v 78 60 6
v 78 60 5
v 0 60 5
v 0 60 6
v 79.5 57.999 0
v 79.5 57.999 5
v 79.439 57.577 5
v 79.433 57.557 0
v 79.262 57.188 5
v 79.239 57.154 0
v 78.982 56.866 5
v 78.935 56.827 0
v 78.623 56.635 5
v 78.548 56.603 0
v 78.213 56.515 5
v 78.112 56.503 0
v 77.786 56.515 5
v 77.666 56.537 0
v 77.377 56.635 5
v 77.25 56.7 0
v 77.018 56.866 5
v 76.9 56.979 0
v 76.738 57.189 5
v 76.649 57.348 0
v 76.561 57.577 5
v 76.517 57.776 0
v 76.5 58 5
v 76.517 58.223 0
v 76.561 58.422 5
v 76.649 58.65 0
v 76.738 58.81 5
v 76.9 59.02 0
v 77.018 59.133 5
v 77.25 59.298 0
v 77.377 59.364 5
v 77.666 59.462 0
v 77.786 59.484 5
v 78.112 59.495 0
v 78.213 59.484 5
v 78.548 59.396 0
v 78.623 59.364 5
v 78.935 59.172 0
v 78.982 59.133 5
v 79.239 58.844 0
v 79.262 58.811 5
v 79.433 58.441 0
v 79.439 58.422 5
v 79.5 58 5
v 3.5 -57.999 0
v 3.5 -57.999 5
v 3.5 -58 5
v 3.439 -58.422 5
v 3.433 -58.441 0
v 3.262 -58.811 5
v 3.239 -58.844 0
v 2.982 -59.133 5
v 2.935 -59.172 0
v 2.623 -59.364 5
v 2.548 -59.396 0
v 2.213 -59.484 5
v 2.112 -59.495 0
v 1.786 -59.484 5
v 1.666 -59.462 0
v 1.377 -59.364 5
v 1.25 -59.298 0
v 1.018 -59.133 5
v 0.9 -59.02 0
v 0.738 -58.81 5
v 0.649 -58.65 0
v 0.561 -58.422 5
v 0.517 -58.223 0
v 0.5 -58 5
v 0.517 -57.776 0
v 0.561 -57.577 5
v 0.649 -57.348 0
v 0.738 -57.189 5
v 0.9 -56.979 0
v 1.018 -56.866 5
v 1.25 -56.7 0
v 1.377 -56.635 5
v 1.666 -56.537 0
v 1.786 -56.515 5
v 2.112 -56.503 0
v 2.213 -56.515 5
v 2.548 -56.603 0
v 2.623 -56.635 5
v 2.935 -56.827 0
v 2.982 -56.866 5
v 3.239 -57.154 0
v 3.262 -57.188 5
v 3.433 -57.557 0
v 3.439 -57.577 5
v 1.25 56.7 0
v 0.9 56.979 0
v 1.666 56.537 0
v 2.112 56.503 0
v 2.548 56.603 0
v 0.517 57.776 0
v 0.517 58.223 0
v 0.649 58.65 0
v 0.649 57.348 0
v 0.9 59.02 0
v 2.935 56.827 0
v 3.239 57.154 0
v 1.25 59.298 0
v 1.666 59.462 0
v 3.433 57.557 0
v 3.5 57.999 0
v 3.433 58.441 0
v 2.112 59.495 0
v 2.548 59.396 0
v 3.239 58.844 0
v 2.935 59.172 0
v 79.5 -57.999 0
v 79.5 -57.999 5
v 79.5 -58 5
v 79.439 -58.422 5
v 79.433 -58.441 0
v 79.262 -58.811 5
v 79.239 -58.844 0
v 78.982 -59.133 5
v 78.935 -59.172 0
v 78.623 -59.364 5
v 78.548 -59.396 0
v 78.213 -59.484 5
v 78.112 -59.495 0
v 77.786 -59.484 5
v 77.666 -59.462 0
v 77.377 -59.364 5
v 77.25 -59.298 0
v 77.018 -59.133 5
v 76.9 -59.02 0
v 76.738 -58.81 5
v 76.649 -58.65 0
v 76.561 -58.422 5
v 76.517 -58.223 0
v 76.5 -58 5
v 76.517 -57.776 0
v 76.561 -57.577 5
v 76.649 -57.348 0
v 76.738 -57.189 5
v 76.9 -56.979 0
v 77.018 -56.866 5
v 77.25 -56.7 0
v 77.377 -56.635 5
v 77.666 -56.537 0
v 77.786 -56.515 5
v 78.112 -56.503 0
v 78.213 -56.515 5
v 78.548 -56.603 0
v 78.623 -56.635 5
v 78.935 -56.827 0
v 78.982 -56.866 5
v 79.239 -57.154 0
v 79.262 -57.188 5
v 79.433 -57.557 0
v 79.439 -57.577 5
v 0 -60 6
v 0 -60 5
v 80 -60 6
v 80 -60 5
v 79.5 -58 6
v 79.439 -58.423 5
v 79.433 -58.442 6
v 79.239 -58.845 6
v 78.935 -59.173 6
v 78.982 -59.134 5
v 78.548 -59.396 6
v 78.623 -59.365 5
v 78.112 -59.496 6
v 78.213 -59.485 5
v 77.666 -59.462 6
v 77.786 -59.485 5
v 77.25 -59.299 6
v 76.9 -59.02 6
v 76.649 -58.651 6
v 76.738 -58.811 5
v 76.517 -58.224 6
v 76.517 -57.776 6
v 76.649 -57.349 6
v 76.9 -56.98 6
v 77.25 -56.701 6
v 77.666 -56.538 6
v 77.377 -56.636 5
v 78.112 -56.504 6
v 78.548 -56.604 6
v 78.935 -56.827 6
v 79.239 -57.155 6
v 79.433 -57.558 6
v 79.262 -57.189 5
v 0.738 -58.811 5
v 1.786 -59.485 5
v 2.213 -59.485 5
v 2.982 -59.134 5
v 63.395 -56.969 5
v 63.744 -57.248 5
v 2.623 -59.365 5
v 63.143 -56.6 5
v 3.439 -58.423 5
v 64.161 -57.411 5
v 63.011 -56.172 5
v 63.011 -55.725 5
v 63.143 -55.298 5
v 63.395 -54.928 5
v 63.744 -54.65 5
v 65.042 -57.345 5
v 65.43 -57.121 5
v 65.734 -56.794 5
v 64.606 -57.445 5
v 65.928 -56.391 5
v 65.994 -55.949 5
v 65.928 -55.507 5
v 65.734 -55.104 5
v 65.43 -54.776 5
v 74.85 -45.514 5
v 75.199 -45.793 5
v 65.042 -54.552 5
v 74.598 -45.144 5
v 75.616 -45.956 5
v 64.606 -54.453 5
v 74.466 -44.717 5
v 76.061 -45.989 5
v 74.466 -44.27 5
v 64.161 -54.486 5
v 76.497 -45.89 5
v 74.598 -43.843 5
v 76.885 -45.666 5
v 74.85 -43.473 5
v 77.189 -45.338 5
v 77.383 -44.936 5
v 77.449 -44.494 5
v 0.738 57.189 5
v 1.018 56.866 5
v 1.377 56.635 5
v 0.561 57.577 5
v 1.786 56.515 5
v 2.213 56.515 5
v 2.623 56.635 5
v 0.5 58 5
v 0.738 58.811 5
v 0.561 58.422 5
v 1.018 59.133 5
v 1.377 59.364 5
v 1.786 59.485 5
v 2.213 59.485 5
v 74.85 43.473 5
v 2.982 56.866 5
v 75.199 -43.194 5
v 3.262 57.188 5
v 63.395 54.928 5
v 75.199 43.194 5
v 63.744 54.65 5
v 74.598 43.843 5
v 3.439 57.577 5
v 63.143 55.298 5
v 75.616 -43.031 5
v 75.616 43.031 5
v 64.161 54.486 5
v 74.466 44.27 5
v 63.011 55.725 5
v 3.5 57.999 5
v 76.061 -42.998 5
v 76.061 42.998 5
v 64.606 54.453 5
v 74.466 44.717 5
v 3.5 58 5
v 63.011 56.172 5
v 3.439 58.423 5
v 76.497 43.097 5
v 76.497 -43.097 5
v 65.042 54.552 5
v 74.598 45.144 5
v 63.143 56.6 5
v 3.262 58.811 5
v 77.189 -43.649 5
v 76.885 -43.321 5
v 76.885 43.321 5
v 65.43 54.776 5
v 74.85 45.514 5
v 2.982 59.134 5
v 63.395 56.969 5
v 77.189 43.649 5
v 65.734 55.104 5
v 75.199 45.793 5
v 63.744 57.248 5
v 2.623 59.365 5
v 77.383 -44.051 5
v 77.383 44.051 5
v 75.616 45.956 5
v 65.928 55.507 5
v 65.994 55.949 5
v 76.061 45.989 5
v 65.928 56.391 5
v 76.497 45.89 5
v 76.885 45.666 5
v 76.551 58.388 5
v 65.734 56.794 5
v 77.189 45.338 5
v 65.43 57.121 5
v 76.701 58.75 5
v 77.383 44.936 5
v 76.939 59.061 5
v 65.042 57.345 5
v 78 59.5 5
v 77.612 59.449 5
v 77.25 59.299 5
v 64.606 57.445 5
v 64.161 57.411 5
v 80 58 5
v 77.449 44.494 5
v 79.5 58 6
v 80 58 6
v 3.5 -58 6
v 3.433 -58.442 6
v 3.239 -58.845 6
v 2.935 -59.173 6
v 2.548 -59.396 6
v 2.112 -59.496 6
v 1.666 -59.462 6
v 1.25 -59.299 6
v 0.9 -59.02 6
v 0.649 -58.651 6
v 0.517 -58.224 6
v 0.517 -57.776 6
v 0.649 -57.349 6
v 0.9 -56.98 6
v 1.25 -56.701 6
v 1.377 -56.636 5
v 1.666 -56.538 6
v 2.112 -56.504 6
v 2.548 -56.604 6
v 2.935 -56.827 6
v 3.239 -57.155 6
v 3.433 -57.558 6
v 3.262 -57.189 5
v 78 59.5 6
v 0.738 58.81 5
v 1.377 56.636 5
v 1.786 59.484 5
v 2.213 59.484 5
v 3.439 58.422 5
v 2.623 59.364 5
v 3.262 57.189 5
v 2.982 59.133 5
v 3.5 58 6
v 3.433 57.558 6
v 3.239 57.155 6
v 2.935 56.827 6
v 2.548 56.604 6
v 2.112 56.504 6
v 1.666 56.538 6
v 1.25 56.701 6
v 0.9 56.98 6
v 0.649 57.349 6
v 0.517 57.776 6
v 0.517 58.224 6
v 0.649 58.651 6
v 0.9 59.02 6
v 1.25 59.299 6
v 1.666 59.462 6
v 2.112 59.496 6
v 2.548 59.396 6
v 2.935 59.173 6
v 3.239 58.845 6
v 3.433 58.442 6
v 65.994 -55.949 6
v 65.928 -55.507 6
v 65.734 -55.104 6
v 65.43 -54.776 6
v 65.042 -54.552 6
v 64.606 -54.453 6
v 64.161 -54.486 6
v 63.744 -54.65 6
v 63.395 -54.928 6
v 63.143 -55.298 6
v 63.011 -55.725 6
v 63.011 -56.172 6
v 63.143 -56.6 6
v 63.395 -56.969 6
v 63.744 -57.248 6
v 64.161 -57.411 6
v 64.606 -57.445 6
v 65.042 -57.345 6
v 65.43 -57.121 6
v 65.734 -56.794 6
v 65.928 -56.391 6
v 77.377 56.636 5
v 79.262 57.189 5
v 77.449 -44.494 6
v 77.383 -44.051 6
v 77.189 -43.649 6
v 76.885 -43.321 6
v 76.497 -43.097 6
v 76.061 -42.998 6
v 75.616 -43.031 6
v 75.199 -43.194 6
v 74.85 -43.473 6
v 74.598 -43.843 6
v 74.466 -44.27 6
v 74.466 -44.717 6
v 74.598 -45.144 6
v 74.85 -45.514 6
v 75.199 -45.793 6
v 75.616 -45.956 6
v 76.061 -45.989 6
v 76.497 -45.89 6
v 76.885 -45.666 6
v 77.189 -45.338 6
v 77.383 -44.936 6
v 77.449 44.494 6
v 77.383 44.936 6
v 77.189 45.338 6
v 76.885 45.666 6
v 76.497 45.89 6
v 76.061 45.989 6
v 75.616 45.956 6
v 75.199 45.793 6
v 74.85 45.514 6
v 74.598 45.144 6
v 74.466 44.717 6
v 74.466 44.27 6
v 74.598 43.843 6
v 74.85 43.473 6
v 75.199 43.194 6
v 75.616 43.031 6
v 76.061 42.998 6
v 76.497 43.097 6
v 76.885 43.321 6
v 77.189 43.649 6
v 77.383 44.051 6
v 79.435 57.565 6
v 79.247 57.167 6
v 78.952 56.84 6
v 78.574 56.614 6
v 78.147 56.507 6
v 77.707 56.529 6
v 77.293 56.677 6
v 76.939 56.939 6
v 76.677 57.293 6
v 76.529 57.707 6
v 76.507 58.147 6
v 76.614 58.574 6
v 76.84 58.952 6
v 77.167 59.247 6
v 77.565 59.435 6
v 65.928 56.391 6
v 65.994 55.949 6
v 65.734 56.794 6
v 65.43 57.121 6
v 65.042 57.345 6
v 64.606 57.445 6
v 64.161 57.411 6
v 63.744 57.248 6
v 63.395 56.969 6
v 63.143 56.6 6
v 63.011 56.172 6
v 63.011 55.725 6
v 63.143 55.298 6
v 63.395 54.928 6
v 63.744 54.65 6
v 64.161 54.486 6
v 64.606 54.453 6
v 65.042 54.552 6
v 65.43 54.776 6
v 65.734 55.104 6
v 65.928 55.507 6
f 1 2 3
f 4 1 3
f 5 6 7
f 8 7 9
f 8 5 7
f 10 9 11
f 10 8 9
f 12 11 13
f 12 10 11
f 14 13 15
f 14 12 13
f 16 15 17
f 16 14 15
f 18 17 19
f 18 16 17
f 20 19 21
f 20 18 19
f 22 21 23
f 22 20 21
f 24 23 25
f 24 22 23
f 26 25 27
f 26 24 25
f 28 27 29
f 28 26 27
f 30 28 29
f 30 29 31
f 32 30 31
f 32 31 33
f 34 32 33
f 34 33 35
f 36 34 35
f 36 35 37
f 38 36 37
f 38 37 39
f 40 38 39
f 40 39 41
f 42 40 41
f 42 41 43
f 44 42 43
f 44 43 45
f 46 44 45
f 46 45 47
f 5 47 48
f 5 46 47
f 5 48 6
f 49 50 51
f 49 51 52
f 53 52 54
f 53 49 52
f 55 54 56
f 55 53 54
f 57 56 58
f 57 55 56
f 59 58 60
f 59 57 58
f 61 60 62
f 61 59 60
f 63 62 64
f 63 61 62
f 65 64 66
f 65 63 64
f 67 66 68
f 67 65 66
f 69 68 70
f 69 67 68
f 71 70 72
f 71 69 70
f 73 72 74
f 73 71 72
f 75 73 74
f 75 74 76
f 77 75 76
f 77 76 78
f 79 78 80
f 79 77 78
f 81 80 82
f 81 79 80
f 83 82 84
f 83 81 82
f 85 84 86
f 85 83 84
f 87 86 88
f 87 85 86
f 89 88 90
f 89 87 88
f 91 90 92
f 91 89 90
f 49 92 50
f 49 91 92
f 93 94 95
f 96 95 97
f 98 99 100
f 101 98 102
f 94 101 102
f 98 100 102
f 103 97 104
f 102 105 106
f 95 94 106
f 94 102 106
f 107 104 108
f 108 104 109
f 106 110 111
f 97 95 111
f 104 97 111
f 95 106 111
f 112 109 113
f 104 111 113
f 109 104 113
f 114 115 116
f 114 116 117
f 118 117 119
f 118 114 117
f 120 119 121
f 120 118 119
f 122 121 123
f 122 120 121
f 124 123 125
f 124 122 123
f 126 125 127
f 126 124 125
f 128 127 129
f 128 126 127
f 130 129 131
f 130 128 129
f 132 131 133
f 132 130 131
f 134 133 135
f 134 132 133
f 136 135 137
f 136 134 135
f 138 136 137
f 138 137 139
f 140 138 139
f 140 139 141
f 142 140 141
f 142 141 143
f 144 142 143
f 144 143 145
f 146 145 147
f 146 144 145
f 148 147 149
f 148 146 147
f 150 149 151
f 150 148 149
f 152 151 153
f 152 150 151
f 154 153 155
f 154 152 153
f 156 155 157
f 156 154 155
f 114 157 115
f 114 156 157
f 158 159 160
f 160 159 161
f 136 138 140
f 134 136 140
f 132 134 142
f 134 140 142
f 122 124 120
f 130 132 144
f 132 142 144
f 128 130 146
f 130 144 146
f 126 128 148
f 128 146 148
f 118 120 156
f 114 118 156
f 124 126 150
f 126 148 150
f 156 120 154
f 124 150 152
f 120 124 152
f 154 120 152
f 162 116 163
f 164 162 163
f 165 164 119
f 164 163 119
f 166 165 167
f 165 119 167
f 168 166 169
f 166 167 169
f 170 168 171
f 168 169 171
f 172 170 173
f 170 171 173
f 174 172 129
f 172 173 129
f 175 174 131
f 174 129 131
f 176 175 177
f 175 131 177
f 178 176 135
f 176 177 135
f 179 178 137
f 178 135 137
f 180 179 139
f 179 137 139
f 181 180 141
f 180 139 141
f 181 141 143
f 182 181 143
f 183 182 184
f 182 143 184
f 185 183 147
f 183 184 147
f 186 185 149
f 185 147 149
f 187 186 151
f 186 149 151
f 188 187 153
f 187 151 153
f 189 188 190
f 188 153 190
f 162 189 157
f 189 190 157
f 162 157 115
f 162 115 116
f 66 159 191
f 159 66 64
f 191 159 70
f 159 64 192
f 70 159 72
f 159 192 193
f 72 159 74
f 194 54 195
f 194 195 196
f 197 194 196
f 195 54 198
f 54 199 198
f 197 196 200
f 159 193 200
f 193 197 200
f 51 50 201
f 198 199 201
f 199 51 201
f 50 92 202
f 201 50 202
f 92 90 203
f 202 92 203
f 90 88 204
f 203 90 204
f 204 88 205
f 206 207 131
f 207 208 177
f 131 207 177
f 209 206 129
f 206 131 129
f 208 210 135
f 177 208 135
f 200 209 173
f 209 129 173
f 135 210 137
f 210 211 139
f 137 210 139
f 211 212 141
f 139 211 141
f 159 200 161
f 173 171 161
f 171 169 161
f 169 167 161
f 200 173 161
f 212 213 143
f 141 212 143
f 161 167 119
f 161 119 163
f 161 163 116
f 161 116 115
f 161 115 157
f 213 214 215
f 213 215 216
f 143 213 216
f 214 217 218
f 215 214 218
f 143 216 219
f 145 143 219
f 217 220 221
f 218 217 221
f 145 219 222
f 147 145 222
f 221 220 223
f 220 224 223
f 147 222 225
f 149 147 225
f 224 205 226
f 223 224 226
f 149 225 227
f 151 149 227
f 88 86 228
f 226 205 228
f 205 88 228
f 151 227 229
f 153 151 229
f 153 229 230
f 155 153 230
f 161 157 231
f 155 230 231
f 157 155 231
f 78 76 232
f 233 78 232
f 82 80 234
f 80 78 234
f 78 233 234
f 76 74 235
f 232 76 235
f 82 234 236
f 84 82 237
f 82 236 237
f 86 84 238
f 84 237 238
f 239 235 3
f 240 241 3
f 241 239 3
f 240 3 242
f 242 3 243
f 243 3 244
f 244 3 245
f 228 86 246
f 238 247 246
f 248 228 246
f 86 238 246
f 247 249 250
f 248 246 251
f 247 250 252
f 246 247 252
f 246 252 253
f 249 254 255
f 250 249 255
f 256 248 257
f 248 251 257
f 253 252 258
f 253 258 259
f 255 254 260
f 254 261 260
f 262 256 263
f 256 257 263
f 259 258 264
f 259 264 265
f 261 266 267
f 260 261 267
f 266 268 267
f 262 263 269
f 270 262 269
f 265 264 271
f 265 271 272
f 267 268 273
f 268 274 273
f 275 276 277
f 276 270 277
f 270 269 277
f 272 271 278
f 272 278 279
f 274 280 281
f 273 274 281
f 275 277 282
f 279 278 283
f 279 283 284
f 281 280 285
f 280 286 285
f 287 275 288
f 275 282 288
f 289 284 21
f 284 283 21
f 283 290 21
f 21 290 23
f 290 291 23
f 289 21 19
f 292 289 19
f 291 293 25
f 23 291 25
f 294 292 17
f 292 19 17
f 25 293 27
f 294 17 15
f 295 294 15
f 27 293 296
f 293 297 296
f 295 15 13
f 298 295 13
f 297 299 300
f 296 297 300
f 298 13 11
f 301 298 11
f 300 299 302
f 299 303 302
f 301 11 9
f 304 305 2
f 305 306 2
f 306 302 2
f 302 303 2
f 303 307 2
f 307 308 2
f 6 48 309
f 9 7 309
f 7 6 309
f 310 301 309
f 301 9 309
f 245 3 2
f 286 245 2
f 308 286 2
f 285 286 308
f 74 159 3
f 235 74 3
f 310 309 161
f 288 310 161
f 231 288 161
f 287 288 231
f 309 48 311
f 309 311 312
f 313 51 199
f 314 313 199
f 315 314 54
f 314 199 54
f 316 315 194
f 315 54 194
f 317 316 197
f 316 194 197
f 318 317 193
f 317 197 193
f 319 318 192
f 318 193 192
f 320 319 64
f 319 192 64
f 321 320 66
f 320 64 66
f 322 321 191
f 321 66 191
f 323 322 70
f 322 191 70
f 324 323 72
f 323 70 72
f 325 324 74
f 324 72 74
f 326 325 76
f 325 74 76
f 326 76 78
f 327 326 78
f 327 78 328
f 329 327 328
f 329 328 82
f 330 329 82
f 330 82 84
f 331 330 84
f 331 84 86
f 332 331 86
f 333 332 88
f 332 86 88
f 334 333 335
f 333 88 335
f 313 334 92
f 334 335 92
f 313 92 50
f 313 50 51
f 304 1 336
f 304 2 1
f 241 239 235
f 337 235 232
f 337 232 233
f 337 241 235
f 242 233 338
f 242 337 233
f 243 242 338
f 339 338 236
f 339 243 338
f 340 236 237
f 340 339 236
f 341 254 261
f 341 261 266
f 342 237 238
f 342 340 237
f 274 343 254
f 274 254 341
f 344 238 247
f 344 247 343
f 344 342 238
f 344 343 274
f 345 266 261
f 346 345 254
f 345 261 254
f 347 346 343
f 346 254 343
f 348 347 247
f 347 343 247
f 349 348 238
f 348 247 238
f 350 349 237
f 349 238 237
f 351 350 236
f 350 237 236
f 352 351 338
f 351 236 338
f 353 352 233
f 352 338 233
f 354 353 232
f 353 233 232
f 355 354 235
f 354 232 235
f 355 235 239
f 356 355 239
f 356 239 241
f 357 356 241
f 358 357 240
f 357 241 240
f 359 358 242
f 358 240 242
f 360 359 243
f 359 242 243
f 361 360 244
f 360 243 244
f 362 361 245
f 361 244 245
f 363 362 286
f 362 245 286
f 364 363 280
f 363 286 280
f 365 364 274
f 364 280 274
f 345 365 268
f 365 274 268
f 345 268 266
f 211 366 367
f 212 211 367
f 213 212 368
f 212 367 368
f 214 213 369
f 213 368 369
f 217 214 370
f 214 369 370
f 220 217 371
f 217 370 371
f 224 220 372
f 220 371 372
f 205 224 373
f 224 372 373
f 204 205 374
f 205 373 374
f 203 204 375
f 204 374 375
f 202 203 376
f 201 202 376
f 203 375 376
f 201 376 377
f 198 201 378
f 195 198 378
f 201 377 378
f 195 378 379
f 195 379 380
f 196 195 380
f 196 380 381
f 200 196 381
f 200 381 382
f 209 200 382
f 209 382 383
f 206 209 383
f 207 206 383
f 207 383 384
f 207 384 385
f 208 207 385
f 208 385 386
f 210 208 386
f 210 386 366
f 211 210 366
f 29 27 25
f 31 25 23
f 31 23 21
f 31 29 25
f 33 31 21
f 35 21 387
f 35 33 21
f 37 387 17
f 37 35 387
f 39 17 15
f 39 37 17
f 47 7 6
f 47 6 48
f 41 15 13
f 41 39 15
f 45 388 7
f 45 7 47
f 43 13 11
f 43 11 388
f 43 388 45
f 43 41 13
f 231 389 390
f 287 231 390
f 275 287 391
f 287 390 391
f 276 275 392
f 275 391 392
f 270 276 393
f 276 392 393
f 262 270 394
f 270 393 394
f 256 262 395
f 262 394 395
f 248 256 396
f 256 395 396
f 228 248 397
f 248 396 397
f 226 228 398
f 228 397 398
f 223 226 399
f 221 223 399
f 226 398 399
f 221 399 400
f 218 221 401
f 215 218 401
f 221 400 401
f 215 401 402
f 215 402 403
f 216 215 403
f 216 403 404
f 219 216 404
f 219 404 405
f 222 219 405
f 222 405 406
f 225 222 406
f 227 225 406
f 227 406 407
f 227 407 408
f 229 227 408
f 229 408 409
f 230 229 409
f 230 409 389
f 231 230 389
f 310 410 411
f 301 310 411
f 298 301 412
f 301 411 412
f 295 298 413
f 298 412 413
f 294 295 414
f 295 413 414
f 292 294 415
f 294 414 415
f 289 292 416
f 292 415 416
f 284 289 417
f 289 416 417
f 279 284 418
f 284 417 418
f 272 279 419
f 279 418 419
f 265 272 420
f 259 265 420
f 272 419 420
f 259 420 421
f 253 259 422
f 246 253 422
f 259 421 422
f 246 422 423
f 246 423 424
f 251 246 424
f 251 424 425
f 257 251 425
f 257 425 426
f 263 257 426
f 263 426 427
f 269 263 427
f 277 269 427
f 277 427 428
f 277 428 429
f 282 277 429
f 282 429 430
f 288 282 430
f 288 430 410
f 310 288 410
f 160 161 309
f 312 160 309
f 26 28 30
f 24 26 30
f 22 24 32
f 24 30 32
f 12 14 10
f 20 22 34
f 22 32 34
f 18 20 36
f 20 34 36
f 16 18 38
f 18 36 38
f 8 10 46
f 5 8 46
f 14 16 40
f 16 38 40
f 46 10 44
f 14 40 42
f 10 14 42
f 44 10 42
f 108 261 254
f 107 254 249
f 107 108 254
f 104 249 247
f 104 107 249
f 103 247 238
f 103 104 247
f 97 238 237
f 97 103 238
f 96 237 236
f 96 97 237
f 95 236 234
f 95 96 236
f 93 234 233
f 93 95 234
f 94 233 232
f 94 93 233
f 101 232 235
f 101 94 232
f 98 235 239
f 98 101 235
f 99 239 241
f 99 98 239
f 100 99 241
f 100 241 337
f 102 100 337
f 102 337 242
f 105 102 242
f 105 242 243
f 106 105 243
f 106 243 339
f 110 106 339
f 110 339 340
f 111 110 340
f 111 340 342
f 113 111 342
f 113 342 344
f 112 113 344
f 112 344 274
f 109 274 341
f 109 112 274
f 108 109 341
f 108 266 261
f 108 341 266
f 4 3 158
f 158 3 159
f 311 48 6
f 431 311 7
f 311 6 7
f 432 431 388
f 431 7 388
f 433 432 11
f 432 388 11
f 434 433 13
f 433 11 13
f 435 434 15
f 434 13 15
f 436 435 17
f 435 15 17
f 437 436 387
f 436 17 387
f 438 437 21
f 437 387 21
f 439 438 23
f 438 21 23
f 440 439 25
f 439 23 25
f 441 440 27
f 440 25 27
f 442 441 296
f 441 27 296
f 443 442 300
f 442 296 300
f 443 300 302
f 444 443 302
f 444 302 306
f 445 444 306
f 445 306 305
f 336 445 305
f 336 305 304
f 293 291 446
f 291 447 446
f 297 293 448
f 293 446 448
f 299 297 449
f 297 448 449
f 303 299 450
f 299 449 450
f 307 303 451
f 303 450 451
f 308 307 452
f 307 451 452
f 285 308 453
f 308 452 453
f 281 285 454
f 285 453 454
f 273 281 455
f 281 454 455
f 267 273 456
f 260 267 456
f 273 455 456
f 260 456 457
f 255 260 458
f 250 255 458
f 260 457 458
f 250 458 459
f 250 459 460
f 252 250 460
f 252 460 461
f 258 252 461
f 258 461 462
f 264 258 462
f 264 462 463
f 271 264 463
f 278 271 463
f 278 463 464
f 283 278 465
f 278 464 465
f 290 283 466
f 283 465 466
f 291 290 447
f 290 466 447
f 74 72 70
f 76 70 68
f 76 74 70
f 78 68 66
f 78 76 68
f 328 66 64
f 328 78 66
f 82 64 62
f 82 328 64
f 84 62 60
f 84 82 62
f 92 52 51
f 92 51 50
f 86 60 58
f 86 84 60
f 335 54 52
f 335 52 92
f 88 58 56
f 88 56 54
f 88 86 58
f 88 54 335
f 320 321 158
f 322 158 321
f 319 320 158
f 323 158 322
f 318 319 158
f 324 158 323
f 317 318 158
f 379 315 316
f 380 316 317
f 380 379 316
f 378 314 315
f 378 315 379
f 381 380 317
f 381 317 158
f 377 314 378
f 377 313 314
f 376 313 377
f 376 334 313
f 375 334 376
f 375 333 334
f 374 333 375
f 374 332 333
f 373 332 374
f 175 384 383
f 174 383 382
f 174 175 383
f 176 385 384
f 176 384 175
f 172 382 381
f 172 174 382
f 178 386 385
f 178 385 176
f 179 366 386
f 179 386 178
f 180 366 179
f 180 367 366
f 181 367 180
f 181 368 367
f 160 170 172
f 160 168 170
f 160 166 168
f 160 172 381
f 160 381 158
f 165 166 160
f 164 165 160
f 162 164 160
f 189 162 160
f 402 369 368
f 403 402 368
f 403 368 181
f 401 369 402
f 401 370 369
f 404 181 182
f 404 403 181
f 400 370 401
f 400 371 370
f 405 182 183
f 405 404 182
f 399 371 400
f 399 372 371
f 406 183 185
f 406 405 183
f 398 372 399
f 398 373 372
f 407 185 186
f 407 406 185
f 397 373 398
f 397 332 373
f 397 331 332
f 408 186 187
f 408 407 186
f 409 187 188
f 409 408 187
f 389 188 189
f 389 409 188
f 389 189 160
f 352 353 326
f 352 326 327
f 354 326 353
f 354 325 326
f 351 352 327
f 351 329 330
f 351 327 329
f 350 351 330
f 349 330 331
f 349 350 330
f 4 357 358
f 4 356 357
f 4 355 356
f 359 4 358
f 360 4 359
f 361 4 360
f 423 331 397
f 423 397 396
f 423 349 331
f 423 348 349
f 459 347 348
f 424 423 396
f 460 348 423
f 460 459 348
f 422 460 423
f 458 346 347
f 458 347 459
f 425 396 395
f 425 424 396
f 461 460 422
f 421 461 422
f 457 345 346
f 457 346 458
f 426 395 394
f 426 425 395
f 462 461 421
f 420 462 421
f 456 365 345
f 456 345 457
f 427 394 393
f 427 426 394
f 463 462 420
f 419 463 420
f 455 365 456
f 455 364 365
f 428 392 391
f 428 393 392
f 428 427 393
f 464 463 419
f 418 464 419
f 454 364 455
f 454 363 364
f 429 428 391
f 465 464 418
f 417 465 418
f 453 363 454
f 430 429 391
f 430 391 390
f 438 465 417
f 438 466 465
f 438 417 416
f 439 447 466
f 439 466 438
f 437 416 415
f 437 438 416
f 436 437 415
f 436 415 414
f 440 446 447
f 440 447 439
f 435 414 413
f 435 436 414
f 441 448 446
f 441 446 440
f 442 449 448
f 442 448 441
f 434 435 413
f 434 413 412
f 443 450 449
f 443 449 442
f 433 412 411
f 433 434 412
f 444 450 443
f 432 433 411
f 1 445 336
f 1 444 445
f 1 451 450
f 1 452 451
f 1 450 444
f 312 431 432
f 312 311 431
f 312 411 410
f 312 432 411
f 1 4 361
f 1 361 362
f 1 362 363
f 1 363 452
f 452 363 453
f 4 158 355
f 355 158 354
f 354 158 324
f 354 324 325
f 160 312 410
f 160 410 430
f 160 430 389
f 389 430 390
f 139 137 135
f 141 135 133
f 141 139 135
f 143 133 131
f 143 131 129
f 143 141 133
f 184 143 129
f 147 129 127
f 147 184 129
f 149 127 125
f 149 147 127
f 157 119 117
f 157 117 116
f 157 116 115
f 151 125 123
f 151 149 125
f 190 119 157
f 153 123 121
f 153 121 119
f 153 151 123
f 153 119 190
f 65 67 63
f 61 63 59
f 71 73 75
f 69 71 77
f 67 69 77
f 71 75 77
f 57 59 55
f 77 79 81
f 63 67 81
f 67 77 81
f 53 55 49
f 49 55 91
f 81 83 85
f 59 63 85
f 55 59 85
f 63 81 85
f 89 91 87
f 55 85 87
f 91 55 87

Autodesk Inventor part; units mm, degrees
ref_plane "YZ Plane" through (0, 0, 0) normal (1, 0, 0) x (0, 1, 0)
ref_plane "XZ Plane" through (0, 0, 0) normal (0, 1, 0) x (-1, 0, 0)
ref_plane "XY Plane" through (0, 0, 0) normal (0, 0, 1) x (1, 0, 0)
sketch "Эскиз2" plane through (0, 0, 0) normal (0, 0, 1) x (1, 0, 0)
  line L0 (80, 60) -> (0, 60)
  line L1 (0, 60) -> (0, -60)
  line L2 (0, -60) -> (80, -60)
  line L3 (80, -60) -> (80, 60)
  line L4 (80, 60) -> (78, 60)
  line L5 (78, 60) -> (78, 58)
  line L6 (78, 58) -> (80, 58)
  line L7 (80, 58) -> (80, 60)
  circle A0 centre (78, 58) radius 1.5
  line L8 (80, 0) -> (0, 0) construction
  circle A1 centre (78, -58) radius 1.5
  line L9 (40, 0) -> (40, 60) construction
  circle A2 centre (2, 58) radius 1.5
  circle A3 centre (2, -58) radius 1.5
  point P0 (79.5, 58)
  point P1 (78, 59.5)
  dimension "d5" = 120
  dimension "d6" = 2
  dimension "d7" = 2
  dimension "d8" = 3
sketch "Эскиз3" plane through (0, 0, 0) normal (0, 0, 1) x (1, 0, 0)
  circle A0 centre (78, 57.9993) radius 1.5
  line L0 (79.5, 0) -> (0, 0)
  line L1 (0, 0) -> (40, 0) construction
  line L2 (40, 0) -> (40, 1.7902)
  line L3 (40, 1.7902) -> (40, 59.4993) construction
  circle A1 centre (78, -57.9993) radius 1.5
  circle A2 centre (2, 57.9993) radius 1.5
  circle A3 centre (2, -57.9993) radius 1.5
  dimension "d11" = 3
  dimension "d12" = 40
extrude "Выдавливание1" add sketch "Эскиз3" along normal blind 5
extrude "Выдавливание2" add sketch "Эскиз2" along normal blind 1 from surface at 5 contours L5 A0 L6 L3 L2 L1 L0
sketch "Эскиз4" plane through (0, -60, 6) normal (0, 0, 1) x (1, 0, 0)
  point P0 (0, 60)
sketch "Эскиз5" plane through (0, -60, 6) normal (0, 0, 1) x (1, 0, 0)
  circle A0 centre (78, 117.9993) radius 1.5 projected
  line L0 (78, 117.9993) -> (89, 117.9993) construction
  circle A1 centre (64.4943, 115.9487) radius 1.5
  circle A2 centre (75.9494, 104.4935) radius 1.5
  line L1 (80, 118) -> (80, 0) projected
  circle A3 centre (64.4943, 4.0513) radius 1.5
  circle A4 centre (75.9494, 15.5065) radius 1.5
  point P0 (0, 60)
  dimension "d21" = 3
  dimension "d22" = 3
extrude "Выдавливание3" cut sketch "Эскиз5" against normal blind 1 contours A1 | A2 | A3 | A4
properties part number "макетная плата"
